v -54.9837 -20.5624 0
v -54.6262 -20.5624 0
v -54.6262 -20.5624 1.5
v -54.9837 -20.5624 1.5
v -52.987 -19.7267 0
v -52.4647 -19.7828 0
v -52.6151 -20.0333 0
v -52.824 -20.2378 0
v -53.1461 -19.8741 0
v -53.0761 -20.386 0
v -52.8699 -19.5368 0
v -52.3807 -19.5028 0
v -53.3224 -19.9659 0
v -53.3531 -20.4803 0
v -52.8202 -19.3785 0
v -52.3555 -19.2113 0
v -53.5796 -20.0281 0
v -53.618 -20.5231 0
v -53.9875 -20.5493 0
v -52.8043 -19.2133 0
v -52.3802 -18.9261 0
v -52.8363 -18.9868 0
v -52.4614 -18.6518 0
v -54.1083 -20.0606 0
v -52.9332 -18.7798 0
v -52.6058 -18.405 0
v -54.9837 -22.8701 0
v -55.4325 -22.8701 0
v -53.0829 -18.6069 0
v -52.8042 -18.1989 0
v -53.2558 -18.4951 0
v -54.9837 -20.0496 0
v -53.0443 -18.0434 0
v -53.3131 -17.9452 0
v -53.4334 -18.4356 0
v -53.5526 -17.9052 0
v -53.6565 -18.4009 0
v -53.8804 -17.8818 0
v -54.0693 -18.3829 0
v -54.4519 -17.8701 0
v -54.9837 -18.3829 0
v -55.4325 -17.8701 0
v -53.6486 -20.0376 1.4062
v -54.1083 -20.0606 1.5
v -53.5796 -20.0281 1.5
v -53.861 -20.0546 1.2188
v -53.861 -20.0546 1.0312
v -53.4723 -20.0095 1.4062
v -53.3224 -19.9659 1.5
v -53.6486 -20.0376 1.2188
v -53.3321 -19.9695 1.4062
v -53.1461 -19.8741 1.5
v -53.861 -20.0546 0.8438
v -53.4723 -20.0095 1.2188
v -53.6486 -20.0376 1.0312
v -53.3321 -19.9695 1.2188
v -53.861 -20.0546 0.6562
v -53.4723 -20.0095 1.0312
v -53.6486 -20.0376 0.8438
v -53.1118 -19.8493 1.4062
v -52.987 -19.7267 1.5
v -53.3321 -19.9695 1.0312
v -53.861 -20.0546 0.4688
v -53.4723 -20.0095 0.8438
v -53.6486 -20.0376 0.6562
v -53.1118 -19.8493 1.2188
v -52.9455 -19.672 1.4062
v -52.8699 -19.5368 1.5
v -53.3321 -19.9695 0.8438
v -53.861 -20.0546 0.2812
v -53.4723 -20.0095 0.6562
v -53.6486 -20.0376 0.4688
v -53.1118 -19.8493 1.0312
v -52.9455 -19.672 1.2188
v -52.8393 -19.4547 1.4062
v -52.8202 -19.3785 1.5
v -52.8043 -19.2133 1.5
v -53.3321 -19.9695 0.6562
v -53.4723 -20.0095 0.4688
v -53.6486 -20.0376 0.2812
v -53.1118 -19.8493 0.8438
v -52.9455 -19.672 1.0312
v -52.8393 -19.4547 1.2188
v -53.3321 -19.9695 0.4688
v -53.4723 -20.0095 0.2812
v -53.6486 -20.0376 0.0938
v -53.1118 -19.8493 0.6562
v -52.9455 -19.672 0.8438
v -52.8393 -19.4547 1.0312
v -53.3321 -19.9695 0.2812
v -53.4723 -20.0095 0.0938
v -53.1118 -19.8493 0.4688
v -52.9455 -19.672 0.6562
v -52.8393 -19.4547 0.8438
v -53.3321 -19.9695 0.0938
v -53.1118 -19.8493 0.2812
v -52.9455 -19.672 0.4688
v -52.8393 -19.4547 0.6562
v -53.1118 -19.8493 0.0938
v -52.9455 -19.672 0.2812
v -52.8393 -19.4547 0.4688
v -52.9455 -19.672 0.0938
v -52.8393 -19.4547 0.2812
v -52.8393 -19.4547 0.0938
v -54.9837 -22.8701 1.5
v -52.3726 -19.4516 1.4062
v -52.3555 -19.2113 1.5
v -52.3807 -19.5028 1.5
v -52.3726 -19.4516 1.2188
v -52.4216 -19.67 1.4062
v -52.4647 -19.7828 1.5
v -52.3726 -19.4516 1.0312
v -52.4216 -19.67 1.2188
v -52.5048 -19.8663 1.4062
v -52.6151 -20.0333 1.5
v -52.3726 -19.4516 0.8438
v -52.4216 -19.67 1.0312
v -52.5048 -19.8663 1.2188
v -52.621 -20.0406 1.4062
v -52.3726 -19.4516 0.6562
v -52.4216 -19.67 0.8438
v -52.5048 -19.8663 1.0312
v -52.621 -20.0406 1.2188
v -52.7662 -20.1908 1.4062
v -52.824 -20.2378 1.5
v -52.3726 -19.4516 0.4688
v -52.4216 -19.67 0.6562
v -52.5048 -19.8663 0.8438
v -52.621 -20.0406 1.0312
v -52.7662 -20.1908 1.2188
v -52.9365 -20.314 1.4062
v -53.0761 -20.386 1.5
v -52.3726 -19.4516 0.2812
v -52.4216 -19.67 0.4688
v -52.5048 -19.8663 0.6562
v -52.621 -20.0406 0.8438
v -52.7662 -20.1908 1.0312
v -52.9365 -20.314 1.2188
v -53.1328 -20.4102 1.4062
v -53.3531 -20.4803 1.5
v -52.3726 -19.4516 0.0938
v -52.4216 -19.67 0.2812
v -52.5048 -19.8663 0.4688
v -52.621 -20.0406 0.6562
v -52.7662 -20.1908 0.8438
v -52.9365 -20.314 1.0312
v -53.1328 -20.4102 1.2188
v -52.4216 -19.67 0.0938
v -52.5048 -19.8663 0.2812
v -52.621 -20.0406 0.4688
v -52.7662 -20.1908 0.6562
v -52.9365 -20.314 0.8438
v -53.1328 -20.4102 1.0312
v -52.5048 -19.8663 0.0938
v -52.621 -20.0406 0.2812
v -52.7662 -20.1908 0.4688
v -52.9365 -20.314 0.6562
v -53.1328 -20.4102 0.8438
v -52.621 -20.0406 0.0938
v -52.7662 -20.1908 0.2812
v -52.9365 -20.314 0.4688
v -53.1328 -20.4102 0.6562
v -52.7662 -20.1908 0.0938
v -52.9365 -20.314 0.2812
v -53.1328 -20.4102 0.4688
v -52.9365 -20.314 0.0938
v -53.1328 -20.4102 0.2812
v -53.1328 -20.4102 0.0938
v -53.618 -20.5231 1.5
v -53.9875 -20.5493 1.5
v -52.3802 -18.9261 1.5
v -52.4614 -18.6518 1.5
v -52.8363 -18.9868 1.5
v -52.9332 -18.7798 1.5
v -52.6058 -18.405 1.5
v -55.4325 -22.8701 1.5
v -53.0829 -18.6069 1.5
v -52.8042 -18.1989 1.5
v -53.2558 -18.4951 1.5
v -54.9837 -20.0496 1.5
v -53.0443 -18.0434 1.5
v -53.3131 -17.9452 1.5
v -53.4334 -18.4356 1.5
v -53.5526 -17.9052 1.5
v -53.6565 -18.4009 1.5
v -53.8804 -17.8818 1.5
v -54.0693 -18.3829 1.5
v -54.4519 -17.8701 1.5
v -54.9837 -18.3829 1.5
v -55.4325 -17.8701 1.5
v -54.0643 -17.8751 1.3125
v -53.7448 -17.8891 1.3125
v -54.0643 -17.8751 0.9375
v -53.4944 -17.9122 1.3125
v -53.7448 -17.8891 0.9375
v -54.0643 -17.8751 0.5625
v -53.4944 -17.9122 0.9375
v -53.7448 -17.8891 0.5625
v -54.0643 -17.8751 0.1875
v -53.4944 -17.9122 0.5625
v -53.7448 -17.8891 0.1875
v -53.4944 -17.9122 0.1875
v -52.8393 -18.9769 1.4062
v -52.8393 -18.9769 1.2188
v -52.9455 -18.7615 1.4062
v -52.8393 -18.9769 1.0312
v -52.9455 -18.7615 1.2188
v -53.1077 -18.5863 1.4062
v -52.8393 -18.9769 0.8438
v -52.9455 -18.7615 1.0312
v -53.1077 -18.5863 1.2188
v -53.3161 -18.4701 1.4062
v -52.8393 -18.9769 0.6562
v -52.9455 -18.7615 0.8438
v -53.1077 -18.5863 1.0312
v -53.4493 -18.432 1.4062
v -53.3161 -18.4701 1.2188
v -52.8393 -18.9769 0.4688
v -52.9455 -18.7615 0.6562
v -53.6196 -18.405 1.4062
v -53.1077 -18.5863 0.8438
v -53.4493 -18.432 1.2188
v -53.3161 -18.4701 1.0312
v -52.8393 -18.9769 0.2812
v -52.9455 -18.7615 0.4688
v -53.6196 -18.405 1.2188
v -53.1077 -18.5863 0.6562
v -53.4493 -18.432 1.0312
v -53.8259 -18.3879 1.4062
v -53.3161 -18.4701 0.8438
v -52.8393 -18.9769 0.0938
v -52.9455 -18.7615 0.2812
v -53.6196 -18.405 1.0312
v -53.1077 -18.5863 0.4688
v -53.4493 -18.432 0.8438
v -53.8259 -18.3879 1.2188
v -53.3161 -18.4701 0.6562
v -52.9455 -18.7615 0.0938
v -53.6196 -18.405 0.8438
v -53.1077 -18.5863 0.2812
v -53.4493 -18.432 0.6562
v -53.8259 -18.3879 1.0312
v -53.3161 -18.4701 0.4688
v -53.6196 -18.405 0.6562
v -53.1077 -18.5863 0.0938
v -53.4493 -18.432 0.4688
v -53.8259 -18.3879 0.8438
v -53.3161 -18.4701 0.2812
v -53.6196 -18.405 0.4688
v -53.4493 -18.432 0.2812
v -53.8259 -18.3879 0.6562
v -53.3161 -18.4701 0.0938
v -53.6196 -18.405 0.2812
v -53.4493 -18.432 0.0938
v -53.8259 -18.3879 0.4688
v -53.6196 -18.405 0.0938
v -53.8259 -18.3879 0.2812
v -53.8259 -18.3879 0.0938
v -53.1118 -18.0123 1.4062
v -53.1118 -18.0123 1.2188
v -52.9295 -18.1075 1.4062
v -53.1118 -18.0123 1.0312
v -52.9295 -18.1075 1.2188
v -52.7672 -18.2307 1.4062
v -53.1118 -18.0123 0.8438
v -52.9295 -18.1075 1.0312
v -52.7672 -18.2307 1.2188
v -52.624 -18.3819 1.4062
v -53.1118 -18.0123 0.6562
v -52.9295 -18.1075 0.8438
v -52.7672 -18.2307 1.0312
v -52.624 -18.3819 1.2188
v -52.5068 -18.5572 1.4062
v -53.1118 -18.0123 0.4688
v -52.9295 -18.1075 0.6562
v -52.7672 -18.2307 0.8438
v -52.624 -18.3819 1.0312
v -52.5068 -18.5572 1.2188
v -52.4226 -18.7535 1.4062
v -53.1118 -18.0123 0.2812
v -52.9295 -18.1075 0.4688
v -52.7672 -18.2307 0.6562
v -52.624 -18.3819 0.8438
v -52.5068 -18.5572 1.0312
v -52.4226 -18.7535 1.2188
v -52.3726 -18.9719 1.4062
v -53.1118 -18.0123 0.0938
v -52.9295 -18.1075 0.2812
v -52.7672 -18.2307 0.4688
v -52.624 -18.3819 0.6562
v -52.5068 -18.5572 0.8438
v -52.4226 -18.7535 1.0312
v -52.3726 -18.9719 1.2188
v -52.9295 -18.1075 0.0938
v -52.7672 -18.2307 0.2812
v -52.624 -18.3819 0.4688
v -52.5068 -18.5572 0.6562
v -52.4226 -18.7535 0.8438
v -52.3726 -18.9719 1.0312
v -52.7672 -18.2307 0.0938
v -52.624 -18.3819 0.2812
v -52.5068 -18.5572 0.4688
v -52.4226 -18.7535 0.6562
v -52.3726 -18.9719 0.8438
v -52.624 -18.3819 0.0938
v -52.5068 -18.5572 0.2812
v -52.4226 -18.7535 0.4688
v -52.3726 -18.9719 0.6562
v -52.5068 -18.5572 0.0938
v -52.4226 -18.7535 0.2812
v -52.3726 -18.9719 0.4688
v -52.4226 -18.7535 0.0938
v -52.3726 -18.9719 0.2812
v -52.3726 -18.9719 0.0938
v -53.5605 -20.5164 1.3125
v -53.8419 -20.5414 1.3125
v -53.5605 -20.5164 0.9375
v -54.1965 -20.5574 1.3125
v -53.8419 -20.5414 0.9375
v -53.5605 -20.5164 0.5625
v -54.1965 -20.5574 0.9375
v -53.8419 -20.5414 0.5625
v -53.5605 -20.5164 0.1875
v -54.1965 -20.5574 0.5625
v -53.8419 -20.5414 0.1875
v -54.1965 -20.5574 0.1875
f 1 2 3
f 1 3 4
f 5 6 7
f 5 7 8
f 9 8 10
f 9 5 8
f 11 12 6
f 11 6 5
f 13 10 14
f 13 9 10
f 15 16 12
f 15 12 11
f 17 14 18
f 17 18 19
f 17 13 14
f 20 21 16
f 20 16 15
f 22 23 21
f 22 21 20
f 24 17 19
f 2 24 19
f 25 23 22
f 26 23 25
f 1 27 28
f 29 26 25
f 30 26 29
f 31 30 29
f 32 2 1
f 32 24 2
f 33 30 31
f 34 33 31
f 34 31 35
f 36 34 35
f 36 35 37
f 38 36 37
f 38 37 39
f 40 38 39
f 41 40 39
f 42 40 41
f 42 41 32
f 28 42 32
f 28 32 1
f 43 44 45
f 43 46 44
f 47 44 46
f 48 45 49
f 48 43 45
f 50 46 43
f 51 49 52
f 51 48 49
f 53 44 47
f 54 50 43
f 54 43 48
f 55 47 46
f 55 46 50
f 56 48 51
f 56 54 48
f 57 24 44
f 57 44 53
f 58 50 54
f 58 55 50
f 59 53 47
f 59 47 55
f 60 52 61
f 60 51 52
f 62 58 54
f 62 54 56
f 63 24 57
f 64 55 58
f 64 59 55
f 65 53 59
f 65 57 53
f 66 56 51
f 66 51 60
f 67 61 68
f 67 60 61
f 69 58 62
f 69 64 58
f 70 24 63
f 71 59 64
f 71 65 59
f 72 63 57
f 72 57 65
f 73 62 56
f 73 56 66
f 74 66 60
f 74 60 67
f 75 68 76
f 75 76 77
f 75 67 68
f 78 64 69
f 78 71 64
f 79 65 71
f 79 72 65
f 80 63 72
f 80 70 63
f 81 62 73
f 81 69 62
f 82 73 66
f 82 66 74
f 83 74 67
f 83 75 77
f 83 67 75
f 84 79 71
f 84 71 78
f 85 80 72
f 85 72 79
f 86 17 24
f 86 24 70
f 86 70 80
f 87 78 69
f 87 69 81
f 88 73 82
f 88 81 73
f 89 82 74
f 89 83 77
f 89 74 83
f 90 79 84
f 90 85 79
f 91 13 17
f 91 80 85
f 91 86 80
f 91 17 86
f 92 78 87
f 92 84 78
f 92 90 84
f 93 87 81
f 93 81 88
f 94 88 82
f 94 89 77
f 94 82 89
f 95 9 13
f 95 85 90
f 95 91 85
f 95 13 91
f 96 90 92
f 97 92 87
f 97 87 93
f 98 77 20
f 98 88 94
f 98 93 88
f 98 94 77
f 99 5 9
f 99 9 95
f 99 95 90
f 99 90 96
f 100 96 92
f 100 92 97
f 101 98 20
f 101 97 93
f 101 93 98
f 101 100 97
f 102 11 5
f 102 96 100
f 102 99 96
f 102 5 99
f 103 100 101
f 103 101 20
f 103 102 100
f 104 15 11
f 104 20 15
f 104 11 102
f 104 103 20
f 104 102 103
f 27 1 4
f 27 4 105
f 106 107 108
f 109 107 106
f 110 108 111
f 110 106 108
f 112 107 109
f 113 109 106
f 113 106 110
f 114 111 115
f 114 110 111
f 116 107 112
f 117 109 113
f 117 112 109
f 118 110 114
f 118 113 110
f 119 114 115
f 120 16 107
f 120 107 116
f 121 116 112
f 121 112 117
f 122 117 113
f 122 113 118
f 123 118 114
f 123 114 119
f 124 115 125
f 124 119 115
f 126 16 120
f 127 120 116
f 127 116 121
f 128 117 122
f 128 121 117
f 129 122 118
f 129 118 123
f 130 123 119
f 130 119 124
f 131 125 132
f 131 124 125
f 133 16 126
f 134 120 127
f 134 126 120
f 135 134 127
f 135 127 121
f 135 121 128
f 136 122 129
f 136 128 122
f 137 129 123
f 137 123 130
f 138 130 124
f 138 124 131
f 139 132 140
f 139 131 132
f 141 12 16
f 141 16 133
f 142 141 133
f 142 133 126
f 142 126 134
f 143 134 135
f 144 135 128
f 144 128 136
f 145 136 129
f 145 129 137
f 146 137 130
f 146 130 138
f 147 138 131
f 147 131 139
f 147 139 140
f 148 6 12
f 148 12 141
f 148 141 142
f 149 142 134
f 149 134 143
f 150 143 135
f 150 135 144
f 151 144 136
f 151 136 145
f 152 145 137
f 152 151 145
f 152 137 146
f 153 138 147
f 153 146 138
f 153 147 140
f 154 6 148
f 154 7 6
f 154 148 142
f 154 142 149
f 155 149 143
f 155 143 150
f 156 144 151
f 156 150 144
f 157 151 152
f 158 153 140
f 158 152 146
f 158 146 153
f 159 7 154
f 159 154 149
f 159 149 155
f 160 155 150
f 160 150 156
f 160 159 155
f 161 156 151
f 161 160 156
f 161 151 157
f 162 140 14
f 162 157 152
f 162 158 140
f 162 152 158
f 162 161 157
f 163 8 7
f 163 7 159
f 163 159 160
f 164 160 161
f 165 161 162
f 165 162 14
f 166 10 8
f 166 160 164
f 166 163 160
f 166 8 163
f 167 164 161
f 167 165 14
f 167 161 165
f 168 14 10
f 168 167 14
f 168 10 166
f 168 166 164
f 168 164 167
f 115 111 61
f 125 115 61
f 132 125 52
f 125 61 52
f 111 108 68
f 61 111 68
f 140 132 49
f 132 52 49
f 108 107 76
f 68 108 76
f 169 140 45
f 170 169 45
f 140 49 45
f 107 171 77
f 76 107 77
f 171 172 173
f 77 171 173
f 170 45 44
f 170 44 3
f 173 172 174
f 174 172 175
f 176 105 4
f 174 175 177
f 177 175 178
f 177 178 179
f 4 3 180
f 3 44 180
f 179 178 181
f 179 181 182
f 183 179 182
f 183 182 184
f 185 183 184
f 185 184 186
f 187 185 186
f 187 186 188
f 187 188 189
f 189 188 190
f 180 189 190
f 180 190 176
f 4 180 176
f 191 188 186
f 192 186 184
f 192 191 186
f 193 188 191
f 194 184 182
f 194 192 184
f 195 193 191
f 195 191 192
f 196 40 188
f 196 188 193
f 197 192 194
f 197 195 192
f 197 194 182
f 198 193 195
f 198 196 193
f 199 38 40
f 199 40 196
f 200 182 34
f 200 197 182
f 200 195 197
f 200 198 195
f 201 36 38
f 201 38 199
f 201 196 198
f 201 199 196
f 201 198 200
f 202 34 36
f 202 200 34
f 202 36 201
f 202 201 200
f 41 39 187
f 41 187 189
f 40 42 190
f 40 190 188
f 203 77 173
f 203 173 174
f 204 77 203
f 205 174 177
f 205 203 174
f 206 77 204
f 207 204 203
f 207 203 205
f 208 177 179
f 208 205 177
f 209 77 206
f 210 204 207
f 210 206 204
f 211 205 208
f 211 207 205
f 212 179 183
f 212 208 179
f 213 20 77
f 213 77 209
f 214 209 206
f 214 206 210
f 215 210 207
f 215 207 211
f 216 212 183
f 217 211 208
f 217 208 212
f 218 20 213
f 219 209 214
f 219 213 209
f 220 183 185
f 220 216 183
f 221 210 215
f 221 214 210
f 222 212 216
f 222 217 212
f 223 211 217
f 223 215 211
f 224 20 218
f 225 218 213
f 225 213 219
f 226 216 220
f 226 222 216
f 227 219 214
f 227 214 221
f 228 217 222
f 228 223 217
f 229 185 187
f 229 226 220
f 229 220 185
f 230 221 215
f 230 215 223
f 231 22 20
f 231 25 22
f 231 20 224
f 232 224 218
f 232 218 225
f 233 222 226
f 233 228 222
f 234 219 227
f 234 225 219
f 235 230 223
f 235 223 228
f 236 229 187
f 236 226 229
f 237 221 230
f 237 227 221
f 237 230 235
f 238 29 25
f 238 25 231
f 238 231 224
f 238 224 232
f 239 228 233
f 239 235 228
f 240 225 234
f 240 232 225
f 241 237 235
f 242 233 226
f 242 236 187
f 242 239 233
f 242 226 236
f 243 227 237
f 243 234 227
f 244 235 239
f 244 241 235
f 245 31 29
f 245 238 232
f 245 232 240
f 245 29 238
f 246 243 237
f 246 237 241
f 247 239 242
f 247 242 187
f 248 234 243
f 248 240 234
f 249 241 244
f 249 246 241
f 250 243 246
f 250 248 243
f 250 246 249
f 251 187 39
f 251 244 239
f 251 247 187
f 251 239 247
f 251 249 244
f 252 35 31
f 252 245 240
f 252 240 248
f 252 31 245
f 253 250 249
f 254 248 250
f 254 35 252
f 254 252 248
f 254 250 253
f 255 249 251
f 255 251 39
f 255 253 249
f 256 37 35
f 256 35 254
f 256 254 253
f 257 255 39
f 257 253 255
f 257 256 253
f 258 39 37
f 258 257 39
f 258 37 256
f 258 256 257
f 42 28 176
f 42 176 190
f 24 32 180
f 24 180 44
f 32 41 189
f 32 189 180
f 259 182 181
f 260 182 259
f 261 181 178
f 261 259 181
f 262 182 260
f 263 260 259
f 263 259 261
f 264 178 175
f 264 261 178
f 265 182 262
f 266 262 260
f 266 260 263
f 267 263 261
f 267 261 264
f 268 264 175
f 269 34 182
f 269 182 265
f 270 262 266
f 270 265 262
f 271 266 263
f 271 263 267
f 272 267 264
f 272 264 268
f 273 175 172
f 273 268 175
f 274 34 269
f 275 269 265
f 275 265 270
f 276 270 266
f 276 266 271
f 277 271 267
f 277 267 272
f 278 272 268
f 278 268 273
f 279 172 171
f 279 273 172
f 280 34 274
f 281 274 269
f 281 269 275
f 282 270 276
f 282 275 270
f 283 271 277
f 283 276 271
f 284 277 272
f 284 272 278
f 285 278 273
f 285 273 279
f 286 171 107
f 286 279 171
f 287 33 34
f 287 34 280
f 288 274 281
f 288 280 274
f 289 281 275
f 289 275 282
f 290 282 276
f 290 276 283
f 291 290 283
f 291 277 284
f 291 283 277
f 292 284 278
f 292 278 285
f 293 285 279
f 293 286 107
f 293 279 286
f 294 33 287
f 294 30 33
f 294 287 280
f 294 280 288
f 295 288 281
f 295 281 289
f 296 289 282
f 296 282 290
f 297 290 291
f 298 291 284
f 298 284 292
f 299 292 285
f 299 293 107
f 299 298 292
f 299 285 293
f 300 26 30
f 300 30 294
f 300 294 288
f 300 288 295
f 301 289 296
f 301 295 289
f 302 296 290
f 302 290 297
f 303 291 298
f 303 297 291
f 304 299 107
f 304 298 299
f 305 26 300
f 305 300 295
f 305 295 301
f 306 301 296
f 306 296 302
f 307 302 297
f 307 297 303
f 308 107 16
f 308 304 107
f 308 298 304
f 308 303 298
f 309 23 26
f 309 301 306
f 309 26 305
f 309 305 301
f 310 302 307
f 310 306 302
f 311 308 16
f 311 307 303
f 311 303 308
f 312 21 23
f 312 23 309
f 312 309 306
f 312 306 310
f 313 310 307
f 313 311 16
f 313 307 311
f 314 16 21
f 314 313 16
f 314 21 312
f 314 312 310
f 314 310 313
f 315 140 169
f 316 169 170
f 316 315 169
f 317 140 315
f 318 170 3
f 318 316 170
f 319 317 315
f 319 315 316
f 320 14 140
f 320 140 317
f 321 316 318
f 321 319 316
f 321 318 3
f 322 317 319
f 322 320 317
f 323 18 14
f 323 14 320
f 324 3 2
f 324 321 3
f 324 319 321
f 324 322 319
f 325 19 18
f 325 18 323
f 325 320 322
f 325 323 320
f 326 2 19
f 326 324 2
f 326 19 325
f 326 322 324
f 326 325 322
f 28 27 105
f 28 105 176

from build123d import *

# Parameters (mm, degrees)
BOSS_EXTRU_1_DEPTH = 1.5


with BuildPart() as part:
    # Esquisse1 → Boss.-Extru.1 (new body)
    with BuildSketch(Plane.XY):
        with BuildLine():
            Line((-55.432465326, -17.870119076), (-54.451896416, -17.870119076))
            add(Edge.make_bspline(
                [(-54.451896416, -17.870119076), (-54.384452264, -17.870193214), (-54.255226274, -17.870335264), (-54.069919052, -17.874642044), (-53.901619435, -17.880394461), (-53.75069032, -17.888368595), (-53.616667322, -17.897792295), (-53.500156894, -17.911009494), (-53.400243242, -17.924809916), (-53.340376886, -17.938840497), (-53.3130743, -17.945239269)],
                knots=[0, 0, 0, 0, 1.415646017, 2.712440637, 3.8905458, 4.950247383, 5.884950622, 6.709939814, 7.411656543, 8, 8, 8, 8], degree=3))
            add(Edge.make_bspline(
                [(-53.3130743, -17.945239269), (-53.278512109, -17.954699197), (-53.210202142, -17.973396142), (-53.11177208, -18.010844319), (-53.018123729, -18.055247412), (-52.928935789, -18.10585304), (-52.845304242, -18.164832417), (-52.765981326, -18.229794728), (-52.691667068, -18.302239826), (-52.622779366, -18.381355169), (-52.559515369, -18.465812612), (-52.505044394, -18.55687294), (-52.459434069, -18.653003374), (-52.42031511, -18.754137047), (-52.392160175, -18.861123223), (-52.370950318, -18.973218527), (-52.357487993, -19.090410941), (-52.356198619, -19.170496466), (-52.355542249, -19.21126491)],
                knots=[0, 0, 0, 0, 0.999701418, 1.975846123, 2.934577507, 3.890451536, 4.834027766, 5.787354733, 6.749476667, 7.726910423, 8.712836071, 9.690891519, 10.682875813, 11.679750201, 12.712814741, 13.765529915, 14.8625177, 16, 16, 16, 16], degree=3))
            add(Edge.make_bspline(
                [(-52.355542249, -19.21126491), (-52.356144284, -19.252376019), (-52.357322207, -19.332812682), (-52.371459758, -19.450488094), (-52.390502888, -19.562942937), (-52.419784392, -19.669927866), (-52.458135353, -19.770807538), (-52.503124, -19.867123584), (-52.557386186, -19.957237401), (-52.619735943, -20.04147614), (-52.689095364, -20.119918872), (-52.76517099, -20.19199715), (-52.847655693, -20.257289062), (-52.936287333, -20.315940982), (-53.031929975, -20.366592809), (-53.133133051, -20.411960388), (-53.240776217, -20.450061903), (-53.315265523, -20.470104848), (-53.353138403, -20.480295358)],
                knots=[0, 0, 0, 0, 1.121902311, 2.195077645, 3.232258892, 4.234102512, 5.217864754, 6.176164875, 7.132989551, 8.084763148, 9.034132444, 9.988522005, 10.94243251, 11.903244335, 12.886203696, 13.894208494, 14.929344452, 16, 16, 16, 16], degree=3))
            add(Edge.make_bspline(
                [(-53.353138403, -20.480295358), (-53.384463166, -20.48695676), (-53.453113205, -20.501555609), (-53.566174236, -20.517853404), (-53.697810502, -20.531764262), (-53.84784233, -20.542194459), (-54.016135052, -20.551123557), (-54.202779705, -20.558220834), (-54.408142673, -20.562120625), (-54.551387307, -20.562321757), (-54.626175262, -20.562426769)],
                knots=[0, 0, 0, 0, 0.601384939, 1.31797006, 2.144135048, 3.087295005, 4.142315834, 5.309527816, 6.595305764, 8, 8, 8, 8], degree=3))
            Line((-54.626175262, -20.562426769), (-54.983747377, -20.562426769))
            Line((-54.983747377, -20.562426769), (-54.983747377, -22.870119076))
            Line((-54.983747377, -22.870119076), (-55.432465326, -22.870119076))
            Line((-55.432465326, -22.870119076), (-55.432465326, -17.870119076))
        make_face()
        with BuildLine():
            Line((-54.983747377, -18.382939589), (-54.983747377, -20.049606256))
            Line((-54.983747377, -20.049606256), (-54.108346736, -20.060623884))
            add(Edge.make_bspline(
                [(-54.108346736, -20.060623884), (-54.065603985, -20.060645975), (-53.983089985, -20.060688621), (-53.86389538, -20.054995444), (-53.753310684, -20.048423255), (-53.651675577, -20.038800507), (-53.558944242, -20.025198711), (-53.474962058, -20.011467656), (-53.400380225, -19.991602853), (-53.313095651, -19.964855611), (-53.215833726, -19.919237589), (-53.110022942, -19.85302346), (-53.020350676, -19.768622448), (-52.942753109, -19.673725546), (-52.881173284, -19.568155362), (-52.836093295, -19.455199738), (-52.809605927, -19.336017095), (-52.806054222, -19.254462611), (-52.804260198, -19.213268115)],
                knots=[0, 0, 0, 0, 1.160613943, 2.240541288, 3.23993089, 4.169200891, 5.011653406, 5.7853311, 6.478053781, 7.106038997, 8.262395093, 9.384106736, 10.481365981, 11.59014053, 12.70357646, 13.786202915, 14.881775077, 16, 16, 16, 16], degree=3))
            add(Edge.make_bspline(
                [(-52.804260198, -19.213268115), (-52.806063978, -19.173070238), (-52.809649671, -19.093161835), (-52.836300904, -18.97604932), (-52.881085638, -18.864284028), (-52.943166488, -18.760036763), (-53.018510959, -18.665481329), (-53.106081449, -18.583342576), (-53.205671823, -18.517311572), (-53.298312153, -18.474692598), (-53.380599561, -18.448670776), (-53.45207379, -18.430463861), (-53.532774753, -18.415927281), (-53.622728724, -18.404156563), (-53.721238487, -18.39408019), (-53.829150365, -18.387243079), (-53.94605557, -18.383240999), (-54.027213528, -18.383042491), (-54.069284236, -18.382939589)],
                knots=[0, 0, 0, 0, 1.120700087, 2.227813068, 3.331159281, 4.466773991, 5.599788987, 6.693661531, 7.80175334, 8.91857717, 9.525282508, 10.207424825, 10.974604443, 11.810962634, 12.737642355, 13.736264703, 14.826523623, 16, 16, 16, 16], degree=3))
            Line((-54.069284236, -18.382939589), (-54.983747377, -18.382939589))
        make_face(mode=Mode.SUBTRACT)
    extrude(amount=BOSS_EXTRU_1_DEPTH)


solid = part.part
